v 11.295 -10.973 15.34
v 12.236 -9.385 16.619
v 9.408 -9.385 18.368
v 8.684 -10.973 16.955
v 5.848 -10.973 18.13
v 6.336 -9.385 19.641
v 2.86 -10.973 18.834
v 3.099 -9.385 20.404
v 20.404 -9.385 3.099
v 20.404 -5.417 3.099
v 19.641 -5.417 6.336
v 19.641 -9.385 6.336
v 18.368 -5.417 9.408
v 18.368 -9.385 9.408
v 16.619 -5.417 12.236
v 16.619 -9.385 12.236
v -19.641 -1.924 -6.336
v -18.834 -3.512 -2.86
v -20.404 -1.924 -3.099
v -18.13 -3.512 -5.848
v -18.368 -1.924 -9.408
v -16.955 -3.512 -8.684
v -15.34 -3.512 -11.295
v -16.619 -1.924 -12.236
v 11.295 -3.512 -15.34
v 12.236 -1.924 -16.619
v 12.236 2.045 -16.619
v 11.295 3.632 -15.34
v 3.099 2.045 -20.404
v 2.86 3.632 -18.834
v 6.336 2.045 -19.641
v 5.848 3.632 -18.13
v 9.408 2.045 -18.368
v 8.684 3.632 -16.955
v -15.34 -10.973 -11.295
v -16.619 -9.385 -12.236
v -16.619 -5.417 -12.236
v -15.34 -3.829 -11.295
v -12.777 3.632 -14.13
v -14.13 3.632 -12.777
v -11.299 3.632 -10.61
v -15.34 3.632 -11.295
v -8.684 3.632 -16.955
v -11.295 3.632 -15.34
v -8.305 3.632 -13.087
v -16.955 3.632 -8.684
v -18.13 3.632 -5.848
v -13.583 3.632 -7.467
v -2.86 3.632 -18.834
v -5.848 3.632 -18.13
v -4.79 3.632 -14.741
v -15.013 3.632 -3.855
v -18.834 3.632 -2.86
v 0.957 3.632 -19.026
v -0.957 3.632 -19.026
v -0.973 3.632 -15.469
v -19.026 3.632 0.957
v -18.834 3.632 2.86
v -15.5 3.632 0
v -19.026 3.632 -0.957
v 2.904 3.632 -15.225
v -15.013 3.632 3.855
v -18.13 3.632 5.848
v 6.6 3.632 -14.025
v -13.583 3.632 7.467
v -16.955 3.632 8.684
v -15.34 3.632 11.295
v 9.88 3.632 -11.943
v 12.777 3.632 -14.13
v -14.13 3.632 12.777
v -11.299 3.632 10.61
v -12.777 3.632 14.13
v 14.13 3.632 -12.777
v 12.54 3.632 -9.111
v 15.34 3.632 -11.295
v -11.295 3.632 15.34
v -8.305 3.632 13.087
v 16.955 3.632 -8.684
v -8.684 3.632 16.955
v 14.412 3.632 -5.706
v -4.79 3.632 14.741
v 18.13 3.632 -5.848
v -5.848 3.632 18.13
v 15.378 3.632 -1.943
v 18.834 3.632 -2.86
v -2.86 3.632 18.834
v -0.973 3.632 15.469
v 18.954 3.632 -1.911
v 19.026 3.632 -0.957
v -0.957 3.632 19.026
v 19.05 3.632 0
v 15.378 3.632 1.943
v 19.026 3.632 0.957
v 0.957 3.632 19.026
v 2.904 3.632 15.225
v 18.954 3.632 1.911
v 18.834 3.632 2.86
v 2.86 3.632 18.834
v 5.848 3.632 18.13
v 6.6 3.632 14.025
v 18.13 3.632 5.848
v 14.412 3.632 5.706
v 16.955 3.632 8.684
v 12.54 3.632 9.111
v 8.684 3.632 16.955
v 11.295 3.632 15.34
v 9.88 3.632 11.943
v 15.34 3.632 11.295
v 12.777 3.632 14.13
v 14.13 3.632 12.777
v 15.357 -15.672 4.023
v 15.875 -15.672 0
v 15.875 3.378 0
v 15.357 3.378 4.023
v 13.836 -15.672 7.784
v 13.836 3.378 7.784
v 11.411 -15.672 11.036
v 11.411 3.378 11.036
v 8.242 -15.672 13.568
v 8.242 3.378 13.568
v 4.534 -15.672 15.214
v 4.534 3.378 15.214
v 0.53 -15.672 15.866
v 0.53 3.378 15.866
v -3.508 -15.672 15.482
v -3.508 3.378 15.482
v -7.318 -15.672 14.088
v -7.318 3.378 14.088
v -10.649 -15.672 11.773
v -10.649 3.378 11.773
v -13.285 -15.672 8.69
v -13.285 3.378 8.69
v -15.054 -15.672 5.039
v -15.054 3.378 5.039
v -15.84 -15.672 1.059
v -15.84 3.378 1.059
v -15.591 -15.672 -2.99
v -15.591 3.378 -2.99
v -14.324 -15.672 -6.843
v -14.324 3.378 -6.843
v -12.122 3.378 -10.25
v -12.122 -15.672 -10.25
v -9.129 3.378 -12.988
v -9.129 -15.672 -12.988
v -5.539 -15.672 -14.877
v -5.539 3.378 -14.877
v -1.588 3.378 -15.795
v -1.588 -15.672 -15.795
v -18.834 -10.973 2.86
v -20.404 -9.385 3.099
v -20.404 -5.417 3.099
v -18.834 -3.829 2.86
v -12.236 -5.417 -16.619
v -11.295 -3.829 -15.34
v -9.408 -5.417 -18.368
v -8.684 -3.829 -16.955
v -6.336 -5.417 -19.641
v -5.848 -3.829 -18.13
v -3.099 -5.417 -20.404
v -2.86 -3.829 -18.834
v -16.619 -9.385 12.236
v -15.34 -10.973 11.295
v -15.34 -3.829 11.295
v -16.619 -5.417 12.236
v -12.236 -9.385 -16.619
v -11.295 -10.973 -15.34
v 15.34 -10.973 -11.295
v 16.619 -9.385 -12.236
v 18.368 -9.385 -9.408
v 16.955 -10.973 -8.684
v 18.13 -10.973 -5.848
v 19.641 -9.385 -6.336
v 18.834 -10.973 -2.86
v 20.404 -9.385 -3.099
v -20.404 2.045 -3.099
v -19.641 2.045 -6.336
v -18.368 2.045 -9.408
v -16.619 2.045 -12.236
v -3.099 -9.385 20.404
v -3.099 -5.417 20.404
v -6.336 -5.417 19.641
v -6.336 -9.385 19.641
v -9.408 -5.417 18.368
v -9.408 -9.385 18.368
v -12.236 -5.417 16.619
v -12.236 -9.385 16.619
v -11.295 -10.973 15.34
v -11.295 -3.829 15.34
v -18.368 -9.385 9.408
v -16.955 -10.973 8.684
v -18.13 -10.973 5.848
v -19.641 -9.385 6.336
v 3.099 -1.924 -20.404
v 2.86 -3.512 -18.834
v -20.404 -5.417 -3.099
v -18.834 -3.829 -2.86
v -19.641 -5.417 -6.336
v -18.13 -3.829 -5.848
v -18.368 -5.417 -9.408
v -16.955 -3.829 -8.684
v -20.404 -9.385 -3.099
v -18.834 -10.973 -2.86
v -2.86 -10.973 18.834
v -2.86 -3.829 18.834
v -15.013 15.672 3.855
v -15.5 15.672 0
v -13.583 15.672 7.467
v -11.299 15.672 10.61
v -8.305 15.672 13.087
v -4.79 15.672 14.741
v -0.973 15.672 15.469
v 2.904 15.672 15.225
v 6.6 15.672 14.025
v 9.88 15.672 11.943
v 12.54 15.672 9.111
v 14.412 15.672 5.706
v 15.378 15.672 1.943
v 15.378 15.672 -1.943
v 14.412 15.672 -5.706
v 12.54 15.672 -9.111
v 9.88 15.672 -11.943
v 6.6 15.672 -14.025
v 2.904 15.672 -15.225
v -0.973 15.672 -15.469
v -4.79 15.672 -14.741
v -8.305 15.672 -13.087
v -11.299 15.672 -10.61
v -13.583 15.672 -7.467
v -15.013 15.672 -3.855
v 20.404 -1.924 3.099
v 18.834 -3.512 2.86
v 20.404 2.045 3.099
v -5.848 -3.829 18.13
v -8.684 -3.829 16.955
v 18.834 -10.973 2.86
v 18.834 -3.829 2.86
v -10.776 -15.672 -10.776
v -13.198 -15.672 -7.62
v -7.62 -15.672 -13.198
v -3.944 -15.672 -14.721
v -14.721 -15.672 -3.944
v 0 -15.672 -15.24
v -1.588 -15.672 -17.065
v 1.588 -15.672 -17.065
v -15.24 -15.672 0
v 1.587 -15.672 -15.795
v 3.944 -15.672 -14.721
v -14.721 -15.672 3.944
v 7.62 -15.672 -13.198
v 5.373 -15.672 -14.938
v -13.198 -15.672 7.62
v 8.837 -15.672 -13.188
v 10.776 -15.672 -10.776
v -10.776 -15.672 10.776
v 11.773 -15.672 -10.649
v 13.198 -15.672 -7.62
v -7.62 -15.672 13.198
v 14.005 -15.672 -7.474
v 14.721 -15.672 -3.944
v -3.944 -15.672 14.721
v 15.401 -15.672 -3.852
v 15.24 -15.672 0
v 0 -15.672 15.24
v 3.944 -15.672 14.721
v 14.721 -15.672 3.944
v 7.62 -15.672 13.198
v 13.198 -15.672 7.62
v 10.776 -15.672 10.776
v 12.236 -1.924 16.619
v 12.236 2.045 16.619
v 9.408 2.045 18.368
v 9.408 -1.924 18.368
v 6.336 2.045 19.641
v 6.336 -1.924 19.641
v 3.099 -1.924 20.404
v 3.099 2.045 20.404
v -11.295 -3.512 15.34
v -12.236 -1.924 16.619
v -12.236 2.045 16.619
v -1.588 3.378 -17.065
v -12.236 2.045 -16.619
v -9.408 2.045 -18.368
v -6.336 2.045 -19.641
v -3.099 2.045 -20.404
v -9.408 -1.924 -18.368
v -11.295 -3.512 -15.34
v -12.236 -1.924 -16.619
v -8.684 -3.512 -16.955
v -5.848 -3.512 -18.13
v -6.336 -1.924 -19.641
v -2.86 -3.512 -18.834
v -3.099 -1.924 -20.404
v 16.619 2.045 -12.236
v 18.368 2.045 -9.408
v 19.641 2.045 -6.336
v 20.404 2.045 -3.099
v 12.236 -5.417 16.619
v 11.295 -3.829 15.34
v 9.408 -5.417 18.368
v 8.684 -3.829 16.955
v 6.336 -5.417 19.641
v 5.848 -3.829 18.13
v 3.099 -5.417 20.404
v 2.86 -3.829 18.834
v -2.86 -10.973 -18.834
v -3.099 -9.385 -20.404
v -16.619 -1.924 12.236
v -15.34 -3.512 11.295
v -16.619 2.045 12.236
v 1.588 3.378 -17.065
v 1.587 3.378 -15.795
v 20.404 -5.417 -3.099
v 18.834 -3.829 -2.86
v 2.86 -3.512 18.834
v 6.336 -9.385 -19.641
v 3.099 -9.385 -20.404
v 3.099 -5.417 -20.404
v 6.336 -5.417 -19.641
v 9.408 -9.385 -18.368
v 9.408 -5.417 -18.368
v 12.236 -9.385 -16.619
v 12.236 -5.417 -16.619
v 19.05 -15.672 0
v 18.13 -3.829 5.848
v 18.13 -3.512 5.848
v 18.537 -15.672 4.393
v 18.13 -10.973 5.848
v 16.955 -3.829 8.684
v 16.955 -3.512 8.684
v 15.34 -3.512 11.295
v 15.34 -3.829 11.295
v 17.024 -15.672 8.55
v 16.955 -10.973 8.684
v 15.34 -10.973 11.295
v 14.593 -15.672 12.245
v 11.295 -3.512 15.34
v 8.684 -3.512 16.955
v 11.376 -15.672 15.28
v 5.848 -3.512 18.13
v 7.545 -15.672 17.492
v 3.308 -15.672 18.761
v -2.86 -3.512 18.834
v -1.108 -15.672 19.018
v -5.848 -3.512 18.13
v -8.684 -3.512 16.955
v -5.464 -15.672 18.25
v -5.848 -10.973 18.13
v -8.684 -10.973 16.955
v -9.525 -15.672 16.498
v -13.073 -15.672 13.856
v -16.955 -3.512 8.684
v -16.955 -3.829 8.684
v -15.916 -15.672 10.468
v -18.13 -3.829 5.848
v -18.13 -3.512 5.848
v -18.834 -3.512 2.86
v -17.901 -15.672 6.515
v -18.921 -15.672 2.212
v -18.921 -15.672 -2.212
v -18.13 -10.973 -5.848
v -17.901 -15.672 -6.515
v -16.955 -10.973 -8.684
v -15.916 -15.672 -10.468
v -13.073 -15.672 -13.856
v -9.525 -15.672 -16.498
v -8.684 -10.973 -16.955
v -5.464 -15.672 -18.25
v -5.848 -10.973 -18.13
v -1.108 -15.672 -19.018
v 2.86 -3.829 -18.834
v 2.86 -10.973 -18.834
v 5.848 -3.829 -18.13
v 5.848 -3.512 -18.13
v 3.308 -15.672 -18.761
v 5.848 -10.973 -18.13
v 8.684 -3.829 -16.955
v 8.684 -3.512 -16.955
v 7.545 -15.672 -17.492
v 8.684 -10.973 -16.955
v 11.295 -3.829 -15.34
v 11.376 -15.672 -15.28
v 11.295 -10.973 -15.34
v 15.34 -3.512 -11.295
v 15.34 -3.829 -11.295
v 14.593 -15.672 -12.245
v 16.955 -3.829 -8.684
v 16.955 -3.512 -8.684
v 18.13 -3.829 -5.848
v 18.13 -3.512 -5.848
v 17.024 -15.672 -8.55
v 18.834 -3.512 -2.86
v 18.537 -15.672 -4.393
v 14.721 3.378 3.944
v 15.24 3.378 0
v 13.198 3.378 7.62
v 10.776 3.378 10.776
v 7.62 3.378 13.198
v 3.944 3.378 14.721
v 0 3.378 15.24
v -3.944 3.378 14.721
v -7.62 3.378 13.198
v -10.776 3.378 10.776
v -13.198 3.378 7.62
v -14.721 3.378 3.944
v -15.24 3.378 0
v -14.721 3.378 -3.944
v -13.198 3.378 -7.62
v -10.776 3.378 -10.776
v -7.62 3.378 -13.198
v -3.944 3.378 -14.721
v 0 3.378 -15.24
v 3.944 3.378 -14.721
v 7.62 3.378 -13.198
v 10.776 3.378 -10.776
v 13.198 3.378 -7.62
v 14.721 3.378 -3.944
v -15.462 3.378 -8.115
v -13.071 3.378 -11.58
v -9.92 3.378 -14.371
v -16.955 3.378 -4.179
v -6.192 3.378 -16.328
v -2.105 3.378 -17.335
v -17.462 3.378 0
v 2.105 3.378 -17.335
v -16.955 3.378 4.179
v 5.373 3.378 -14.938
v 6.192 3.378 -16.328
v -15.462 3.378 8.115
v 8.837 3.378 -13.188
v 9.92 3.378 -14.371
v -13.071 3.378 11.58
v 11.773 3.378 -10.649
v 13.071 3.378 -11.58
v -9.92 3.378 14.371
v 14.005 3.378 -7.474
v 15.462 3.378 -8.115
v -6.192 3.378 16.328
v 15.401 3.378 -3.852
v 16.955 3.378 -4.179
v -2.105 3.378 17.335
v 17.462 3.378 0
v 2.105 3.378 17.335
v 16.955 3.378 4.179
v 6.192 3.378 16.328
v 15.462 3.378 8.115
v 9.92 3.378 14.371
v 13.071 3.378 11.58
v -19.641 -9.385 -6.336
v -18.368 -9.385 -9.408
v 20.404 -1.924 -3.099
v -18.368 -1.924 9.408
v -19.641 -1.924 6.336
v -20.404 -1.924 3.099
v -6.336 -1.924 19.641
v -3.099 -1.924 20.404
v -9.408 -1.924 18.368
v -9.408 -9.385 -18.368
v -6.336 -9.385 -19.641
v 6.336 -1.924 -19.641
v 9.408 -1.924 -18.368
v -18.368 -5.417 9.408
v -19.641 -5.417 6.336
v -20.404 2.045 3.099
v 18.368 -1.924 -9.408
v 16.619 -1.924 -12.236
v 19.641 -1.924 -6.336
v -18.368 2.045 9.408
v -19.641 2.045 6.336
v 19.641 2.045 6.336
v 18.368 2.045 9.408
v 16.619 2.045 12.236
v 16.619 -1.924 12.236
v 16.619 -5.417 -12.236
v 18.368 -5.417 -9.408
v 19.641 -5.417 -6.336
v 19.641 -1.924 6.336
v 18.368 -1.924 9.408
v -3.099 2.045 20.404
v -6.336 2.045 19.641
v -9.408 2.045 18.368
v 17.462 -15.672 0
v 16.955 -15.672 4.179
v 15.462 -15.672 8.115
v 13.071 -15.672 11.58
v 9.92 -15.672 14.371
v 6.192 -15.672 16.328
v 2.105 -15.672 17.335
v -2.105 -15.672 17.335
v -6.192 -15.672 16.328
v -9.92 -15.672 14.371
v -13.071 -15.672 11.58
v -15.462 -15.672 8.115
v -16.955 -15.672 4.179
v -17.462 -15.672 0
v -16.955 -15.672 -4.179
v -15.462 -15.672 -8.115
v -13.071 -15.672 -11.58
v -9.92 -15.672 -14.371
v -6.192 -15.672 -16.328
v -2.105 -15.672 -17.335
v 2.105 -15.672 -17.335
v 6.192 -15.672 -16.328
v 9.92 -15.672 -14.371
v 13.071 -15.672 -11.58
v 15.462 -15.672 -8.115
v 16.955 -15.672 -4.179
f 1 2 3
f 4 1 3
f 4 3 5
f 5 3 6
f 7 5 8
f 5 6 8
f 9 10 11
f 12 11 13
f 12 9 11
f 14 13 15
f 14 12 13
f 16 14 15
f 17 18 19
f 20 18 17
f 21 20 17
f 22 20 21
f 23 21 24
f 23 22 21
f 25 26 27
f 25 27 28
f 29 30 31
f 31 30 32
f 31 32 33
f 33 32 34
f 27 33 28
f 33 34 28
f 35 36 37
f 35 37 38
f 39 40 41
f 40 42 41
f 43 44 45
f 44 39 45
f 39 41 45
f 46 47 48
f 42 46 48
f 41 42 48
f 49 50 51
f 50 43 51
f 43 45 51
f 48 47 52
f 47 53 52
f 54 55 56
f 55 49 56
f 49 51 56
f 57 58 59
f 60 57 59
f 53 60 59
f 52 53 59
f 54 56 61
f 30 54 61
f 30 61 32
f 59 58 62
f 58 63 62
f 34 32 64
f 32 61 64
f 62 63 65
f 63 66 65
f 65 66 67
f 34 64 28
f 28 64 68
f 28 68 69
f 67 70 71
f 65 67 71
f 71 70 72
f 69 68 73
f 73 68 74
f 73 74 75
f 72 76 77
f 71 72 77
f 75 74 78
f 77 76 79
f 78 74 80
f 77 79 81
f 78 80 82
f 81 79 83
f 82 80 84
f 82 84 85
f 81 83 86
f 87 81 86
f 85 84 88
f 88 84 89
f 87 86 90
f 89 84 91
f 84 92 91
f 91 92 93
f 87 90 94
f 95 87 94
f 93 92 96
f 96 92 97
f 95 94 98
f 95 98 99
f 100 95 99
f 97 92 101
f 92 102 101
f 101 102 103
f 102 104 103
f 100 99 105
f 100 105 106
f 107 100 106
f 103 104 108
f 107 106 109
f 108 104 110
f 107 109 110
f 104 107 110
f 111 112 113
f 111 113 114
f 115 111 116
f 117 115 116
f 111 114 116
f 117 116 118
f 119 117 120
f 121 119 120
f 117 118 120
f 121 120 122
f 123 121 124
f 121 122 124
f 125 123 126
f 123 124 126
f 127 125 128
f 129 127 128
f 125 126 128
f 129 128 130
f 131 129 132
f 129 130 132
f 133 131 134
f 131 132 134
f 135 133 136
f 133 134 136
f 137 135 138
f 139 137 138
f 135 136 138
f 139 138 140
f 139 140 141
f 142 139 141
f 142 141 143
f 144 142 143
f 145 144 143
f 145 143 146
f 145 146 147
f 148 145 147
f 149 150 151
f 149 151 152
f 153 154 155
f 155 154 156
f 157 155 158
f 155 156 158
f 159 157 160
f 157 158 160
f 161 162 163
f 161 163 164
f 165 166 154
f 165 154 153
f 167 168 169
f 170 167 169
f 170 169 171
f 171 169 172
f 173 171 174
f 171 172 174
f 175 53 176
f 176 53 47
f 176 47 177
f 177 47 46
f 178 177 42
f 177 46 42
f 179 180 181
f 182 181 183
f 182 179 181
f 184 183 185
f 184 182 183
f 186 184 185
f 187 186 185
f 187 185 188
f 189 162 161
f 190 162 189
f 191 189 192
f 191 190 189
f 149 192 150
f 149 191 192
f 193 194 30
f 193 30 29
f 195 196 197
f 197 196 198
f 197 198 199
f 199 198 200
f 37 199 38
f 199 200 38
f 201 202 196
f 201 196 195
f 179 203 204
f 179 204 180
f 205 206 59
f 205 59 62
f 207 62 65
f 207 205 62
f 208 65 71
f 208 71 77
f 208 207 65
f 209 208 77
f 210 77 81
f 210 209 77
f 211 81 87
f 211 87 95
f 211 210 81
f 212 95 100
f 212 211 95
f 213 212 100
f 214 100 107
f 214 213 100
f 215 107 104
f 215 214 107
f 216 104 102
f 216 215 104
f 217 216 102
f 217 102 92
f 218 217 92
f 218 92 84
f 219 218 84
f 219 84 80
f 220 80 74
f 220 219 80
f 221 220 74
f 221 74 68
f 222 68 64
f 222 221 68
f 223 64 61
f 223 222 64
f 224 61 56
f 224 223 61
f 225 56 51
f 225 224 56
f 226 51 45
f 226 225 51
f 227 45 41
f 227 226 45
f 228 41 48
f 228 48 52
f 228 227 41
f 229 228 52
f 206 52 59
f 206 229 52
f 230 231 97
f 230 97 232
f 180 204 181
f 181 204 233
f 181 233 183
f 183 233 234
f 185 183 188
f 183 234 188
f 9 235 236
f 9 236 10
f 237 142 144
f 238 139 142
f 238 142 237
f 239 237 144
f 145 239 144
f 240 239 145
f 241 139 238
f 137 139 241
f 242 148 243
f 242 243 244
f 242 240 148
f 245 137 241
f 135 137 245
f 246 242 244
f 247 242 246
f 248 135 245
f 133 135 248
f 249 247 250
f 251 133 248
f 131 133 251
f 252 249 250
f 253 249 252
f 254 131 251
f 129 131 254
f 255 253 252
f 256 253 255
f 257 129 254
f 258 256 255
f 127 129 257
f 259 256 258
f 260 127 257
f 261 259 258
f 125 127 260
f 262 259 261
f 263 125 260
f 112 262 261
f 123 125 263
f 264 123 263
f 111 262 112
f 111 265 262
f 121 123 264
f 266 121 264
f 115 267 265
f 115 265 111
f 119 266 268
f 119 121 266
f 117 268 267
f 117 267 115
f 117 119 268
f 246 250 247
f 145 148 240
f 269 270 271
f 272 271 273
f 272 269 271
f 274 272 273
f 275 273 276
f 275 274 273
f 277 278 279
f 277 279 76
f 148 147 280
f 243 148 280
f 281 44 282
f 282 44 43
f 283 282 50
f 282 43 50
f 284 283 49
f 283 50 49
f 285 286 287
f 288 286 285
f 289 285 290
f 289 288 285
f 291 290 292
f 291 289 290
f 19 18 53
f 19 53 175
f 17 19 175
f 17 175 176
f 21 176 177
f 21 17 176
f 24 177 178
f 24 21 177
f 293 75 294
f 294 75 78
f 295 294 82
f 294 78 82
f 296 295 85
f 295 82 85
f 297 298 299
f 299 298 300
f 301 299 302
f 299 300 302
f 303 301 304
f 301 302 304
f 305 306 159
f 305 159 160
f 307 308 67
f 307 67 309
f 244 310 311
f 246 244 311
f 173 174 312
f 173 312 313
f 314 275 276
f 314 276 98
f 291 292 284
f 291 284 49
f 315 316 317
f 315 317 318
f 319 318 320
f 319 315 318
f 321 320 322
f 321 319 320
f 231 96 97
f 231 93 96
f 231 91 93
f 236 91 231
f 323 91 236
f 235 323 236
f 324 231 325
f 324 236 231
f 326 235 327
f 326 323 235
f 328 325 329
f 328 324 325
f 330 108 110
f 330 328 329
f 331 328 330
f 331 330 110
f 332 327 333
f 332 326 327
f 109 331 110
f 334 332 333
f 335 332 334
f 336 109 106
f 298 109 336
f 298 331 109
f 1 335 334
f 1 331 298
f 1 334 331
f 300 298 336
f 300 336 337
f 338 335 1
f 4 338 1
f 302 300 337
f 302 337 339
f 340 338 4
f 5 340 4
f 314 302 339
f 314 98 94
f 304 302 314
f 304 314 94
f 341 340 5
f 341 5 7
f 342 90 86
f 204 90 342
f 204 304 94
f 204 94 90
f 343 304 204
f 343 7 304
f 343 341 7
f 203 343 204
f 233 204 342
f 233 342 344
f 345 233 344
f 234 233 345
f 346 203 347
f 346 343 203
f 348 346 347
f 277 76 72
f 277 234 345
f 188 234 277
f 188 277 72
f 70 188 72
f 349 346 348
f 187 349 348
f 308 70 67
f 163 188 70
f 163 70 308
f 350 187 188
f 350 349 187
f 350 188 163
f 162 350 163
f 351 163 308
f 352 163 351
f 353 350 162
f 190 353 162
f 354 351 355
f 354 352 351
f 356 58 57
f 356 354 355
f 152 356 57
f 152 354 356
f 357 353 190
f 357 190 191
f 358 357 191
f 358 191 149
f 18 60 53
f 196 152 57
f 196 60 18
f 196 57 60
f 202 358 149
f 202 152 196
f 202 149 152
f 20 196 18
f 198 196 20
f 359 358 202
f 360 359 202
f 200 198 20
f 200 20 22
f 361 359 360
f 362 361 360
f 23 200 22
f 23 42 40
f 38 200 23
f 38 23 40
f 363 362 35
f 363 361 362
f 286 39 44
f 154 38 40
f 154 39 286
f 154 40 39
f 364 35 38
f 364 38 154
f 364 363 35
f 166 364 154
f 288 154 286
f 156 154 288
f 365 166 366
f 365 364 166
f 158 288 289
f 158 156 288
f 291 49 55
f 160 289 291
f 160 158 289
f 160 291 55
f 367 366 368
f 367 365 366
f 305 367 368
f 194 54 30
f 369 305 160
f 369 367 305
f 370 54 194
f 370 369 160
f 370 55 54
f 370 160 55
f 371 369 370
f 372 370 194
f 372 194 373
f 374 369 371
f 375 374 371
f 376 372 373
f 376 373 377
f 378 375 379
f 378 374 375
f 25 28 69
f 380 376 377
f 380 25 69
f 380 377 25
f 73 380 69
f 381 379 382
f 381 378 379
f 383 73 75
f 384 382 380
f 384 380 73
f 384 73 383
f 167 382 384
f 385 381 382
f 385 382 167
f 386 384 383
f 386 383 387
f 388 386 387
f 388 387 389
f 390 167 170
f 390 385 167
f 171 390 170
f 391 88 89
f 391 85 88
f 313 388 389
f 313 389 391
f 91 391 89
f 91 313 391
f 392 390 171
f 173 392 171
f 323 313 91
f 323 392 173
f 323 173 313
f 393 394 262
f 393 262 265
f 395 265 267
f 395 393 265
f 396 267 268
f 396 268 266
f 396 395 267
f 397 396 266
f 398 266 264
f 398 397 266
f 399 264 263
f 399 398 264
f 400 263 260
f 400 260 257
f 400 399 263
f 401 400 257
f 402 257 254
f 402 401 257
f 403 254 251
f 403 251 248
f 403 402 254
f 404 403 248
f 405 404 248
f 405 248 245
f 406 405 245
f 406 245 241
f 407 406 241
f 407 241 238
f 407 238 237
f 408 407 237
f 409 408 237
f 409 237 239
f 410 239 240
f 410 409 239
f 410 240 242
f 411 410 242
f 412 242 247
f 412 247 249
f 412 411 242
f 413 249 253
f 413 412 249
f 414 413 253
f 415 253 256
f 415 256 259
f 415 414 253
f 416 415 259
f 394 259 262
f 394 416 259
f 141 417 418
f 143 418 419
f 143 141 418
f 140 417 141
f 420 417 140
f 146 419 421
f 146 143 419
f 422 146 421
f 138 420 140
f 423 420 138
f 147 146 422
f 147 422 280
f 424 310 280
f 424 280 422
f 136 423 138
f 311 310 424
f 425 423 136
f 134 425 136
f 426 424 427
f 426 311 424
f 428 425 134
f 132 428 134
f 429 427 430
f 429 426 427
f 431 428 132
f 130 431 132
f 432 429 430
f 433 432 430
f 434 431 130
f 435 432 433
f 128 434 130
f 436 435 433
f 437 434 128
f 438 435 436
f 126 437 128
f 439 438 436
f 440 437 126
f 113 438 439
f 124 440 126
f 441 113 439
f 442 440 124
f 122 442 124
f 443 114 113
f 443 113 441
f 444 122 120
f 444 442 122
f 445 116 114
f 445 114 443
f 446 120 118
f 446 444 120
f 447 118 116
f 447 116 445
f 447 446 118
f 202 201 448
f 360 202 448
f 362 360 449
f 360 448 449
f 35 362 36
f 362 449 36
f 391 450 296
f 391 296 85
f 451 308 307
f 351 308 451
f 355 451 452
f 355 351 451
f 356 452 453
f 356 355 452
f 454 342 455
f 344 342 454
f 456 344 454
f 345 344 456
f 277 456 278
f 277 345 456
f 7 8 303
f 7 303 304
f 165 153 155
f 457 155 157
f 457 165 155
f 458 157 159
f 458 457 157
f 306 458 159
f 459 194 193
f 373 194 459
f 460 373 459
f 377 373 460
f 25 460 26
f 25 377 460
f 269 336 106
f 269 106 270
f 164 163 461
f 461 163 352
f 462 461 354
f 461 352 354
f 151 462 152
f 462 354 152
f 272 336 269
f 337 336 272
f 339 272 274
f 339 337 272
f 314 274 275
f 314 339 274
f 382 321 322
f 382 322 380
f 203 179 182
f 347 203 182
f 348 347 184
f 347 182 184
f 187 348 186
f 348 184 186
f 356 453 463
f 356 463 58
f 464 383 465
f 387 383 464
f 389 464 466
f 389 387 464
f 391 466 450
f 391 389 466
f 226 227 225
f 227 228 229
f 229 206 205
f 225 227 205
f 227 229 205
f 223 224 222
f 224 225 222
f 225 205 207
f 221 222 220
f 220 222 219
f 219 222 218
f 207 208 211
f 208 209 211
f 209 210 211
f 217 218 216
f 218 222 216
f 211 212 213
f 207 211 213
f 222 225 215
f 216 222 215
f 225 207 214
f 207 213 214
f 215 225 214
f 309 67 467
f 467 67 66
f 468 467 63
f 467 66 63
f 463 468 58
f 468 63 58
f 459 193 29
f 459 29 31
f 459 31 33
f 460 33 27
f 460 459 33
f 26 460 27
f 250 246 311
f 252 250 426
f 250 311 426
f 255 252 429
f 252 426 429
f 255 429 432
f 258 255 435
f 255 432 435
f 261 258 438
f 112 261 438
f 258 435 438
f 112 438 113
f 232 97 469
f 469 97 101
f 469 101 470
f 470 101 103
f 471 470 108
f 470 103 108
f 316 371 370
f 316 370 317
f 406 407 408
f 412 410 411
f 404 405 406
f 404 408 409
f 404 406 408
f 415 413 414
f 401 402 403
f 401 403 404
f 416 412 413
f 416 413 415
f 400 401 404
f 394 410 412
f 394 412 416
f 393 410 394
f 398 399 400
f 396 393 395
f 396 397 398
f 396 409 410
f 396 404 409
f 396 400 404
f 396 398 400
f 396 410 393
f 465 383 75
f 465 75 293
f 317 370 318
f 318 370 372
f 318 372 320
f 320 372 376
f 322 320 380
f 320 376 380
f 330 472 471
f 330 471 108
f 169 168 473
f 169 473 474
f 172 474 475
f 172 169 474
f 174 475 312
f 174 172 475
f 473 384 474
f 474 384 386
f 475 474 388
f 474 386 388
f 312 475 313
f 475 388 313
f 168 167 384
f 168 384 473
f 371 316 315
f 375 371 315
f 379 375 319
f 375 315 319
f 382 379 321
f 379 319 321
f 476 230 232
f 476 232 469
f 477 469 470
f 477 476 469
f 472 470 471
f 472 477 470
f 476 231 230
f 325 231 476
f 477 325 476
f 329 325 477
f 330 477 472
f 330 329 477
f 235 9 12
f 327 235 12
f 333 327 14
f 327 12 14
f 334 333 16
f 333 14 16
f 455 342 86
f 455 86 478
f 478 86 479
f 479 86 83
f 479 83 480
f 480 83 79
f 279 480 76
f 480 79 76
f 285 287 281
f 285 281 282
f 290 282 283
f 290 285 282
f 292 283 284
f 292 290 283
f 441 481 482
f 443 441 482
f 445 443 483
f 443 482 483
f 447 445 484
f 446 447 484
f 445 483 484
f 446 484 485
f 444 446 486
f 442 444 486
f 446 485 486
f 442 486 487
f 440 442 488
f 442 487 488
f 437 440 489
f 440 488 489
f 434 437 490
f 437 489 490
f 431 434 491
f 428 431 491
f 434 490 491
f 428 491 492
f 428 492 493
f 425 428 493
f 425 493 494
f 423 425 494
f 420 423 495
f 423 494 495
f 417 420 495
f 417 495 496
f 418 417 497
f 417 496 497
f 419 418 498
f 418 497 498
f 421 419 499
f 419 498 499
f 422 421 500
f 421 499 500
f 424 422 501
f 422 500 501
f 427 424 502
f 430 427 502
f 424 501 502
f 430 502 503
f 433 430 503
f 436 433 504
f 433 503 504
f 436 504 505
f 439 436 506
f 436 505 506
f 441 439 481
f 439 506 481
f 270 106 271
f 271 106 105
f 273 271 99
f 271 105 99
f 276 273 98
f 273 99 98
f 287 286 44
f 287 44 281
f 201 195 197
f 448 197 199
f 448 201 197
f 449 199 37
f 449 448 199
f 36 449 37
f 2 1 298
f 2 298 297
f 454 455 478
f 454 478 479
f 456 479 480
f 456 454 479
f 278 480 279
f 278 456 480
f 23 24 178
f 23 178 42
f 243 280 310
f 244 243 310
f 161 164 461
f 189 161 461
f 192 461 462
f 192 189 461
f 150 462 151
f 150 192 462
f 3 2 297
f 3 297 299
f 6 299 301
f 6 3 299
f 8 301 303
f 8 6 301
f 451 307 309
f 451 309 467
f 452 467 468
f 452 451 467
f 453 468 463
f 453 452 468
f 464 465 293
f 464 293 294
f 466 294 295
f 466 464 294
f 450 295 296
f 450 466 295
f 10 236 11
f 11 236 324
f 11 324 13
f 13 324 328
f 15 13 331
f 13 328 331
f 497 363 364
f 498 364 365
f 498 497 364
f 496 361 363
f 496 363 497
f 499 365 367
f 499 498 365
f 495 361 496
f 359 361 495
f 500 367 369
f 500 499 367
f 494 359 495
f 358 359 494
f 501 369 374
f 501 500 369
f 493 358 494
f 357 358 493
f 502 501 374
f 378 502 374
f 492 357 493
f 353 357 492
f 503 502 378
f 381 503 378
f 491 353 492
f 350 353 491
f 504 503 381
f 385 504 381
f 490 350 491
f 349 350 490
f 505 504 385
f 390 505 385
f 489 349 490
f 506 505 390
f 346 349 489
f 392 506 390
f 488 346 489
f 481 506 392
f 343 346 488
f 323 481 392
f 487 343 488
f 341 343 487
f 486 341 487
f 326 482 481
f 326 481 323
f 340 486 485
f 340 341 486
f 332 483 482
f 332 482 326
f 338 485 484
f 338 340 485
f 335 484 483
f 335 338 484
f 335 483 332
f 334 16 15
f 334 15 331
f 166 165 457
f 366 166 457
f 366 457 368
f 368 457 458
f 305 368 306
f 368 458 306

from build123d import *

# Parameters (mm, degrees)
F0_R      = 19.05
F1_DEPTH  = 15.6718
F4_DEPTH  = 14.605
F5_R      = 17.4625
F6_DEPTH  = 19.05
F7_R      = 19.05
F7_R_2    = 15.5
F8_DEPTH  = 12.0396
F10_R     = 20.6375
F10_R_2   = 19.05
F11_DEPTH = 0.15875
F12_SIZE  = 1.58749
F13_R     = 15.24
F14_DEPTH = 19.05


# Not quite as in the source:
# - a fillet or chamfer is up to 0.001 mm smaller than in the source, because OpenCascade refuses the exact size


with BuildPart() as f1:
    # F0 (on Front) → F1 (new body, symmetric)
    with BuildSketch(Plane.XZ):
        Circle(F0_R)
    extrude(amount=F1_DEPTH, both=True)

    # F3 (on offset) → F4 (join)
    with BuildSketch(Plane.XZ.offset(10.9728)):
        with BuildLine():
            Line((-20.4035253035, 3.0988), (0, 0))
            Line((0, 0), (-16.6186535957, 12.2362886087))
            ThreePointArc((-16.6186535957, 12.2362886087), (-19.0665638522, 7.8976293354), (-20.4035253035, 3.0988))
        make_face()
        with BuildLine():
            Line((-12.2362886087, 16.6186535957), (0, 0))
            Line((0, 0), (-3.0988, 20.4035253035))
            ThreePointArc((-3.0988, 20.4035253035), (-7.8976293354, 19.0665638522), (-12.2362886087, 16.6186535957))
        make_face()
        with BuildLine():
            Line((3.0988, 20.4035253035), (0, 0))
            Line((0, 0), (12.2362886087, 16.6186535957))
            ThreePointArc((12.2362886087, 16.6186535957), (7.8976293354, 19.0665638522), (3.0988, 20.4035253035))
        make_face()
        with BuildLine():
            Line((0, 0), (20.4035253035, 3.0988))
            ThreePointArc((20.4035253035, 3.0988), (19.0665638522, 7.8976293354), (16.6186535957, 12.2362886087))
            Line((16.6186535957, 12.2362886087), (0, 0))
        make_face()
        with BuildLine():
            ThreePointArc((16.6186535957, -12.2362886087), (19.0665638522, -7.8976293354), (20.4035253035, -3.0988))
            Line((20.4035253035, -3.0988), (0, 0))
            Line((0, 0), (16.6186535957, -12.2362886087))
        make_face()
        with BuildLine():
            Line((12.2362886087, -16.6186535957), (0, 0))
            Line((0, 0), (3.0988, -20.4035253035))
            ThreePointArc((3.0988, -20.4035253035), (7.8976293354, -19.0665638522), (12.2362886087, -16.6186535957))
        make_face()
        with BuildLine():
            Line((-3.0988, -20.4035253035), (0, 0))
            Line((0, 0), (-12.2362886087, -16.6186535957))
            ThreePointArc((-12.2362886087, -16.6186535957), (-7.8976293354, -19.0665638522), (-3.0988, -20.4035253035))
        make_face()
        with BuildLine():
            Line((-16.6186535957, -12.2362886087), (0, 0))
            Line((0, 0), (-20.4035253035, -3.0988))
            ThreePointArc((-20.4035253035, -3.0988), (-19.0665638522, -7.8976293354), (-16.6186535957, -12.2362886087))
        make_face()
    extrude(amount=-F4_DEPTH)

    # F5 (on face) → F6 (cut)
    with BuildSketch(Plane.XZ.offset(15.6718)):
        Circle(F5_R)
    extrude(amount=-F6_DEPTH, mode=Mode.SUBTRACT)

    # F7 (on face) → F8 (cut)
    with BuildSketch(Plane(origin=(0, 15.6718, 0), x_dir=(-1, 0, 0), z_dir=(0, 1, 0))):
        Circle(F7_R)
        Circle(F7_R_2, mode=Mode.SUBTRACT)
    extrude(amount=-F8_DEPTH, mode=Mode.SUBTRACT)

    # F10 (on offset) → F11 (cut, symmetric)
    with BuildSketch(Plane.XZ.offset(3.6703)):
        Circle(F10_R)
        Circle(F10_R_2, mode=Mode.SUBTRACT)
    extrude(amount=F11_DEPTH, both=True, mode=Mode.SUBTRACT)

    # F12 (size 1.5875 in the source; OpenCascade refuses exactly that, so slightly less here)
    f12_edges = [f1.edges().sort_by_distance(p)[0] for p in [
        (-7.897629, -3.51155, 19.066564),
        (-7.897629, -3.82905, 19.066564),
        (-7.897629, -10.9728, 19.066564),
        (-7.897629, 3.6322, 19.066564),
        (-19.066564, 3.6322, 7.897629),
        (-19.066564, -3.51155, 7.897629),
        (-19.066564, -3.82905, 7.897629),
        (-19.066564, -10.9728, 7.897629),
        (-19.066564, -10.9728, -7.897629),
        (-19.066564, -3.82905, -7.897629),
        (-19.066564, -3.51155, -7.897629),
        (-19.066564, 3.6322, -7.897629),
        (-7.897629, -10.9728, -19.066564),
        (-7.897629, -3.82905, -19.066564),
        (-7.897629, -3.51155, -19.066564),
        (-7.897629, 3.6322, -19.066564),
        (7.897629, -3.82905, -19.066564),
        (7.897629, -10.9728, -19.066564),
        (7.897629, -3.51155, -19.066564),
        (7.897629, 3.6322, -19.066564),
        (19.066564, 3.6322, -7.897629),
        (19.066564, -3.51155, -7.897629),
        (19.066564, -3.82905, -7.897629),
        (19.066564, -10.9728, -7.897629),
        (19.066564, 3.6322, 7.897629),
        (19.066564, -3.51155, 7.897629),
        (19.066564, -3.82905, 7.897629),
        (19.066564, -10.9728, 7.897629),
        (7.897629, 3.6322, 19.066564),
        (7.897629, -3.51155, 19.066564),
        (7.897629, -3.82905, 19.066564),
        (7.897629, -10.9728, 19.066564),
    ]]
    chamfer(f12_edges, length=F12_SIZE)

    # F13 (on face) → F14 (join)
    with BuildSketch(Plane.XZ.offset(-3.3782)):
        with BuildLine():
            Line((1.5875, -15.7954255641), (-1.5875, -15.7954255641))
            ThreePointArc((-1.5875, -15.7954255641), (0, -15.875), (1.5875, -15.7954255641))
        make_face()
        with BuildLine():
            ThreePointArc((1.5875, -15.7954255641), (11.7732150983, -10.6492737428), (15.875, 0))
            ThreePointArc((15.875, 0), (-10.6492737428, 11.7732150983), (-1.5875, -15.7954255641))
            Line((-1.5875, -15.7954255641), (1.5875, -15.7954255641))
        make_face()
        Circle(F13_R, mode=Mode.SUBTRACT)
        with BuildLine():
            ThreePointArc((1.5875, -15.7954255641), (0, -15.875), (-1.5875, -15.7954255641))
            Line((-1.5875, -15.7954255641), (-1.5875, -17.0654255641))
            Line((-1.5875, -17.0654255641), (1.5875, -17.0654255641))
            Line((1.5875, -17.0654255641), (1.5875, -15.7954255641))
        make_face()
    extrude(amount=F14_DEPTH)


solid = f1.part
